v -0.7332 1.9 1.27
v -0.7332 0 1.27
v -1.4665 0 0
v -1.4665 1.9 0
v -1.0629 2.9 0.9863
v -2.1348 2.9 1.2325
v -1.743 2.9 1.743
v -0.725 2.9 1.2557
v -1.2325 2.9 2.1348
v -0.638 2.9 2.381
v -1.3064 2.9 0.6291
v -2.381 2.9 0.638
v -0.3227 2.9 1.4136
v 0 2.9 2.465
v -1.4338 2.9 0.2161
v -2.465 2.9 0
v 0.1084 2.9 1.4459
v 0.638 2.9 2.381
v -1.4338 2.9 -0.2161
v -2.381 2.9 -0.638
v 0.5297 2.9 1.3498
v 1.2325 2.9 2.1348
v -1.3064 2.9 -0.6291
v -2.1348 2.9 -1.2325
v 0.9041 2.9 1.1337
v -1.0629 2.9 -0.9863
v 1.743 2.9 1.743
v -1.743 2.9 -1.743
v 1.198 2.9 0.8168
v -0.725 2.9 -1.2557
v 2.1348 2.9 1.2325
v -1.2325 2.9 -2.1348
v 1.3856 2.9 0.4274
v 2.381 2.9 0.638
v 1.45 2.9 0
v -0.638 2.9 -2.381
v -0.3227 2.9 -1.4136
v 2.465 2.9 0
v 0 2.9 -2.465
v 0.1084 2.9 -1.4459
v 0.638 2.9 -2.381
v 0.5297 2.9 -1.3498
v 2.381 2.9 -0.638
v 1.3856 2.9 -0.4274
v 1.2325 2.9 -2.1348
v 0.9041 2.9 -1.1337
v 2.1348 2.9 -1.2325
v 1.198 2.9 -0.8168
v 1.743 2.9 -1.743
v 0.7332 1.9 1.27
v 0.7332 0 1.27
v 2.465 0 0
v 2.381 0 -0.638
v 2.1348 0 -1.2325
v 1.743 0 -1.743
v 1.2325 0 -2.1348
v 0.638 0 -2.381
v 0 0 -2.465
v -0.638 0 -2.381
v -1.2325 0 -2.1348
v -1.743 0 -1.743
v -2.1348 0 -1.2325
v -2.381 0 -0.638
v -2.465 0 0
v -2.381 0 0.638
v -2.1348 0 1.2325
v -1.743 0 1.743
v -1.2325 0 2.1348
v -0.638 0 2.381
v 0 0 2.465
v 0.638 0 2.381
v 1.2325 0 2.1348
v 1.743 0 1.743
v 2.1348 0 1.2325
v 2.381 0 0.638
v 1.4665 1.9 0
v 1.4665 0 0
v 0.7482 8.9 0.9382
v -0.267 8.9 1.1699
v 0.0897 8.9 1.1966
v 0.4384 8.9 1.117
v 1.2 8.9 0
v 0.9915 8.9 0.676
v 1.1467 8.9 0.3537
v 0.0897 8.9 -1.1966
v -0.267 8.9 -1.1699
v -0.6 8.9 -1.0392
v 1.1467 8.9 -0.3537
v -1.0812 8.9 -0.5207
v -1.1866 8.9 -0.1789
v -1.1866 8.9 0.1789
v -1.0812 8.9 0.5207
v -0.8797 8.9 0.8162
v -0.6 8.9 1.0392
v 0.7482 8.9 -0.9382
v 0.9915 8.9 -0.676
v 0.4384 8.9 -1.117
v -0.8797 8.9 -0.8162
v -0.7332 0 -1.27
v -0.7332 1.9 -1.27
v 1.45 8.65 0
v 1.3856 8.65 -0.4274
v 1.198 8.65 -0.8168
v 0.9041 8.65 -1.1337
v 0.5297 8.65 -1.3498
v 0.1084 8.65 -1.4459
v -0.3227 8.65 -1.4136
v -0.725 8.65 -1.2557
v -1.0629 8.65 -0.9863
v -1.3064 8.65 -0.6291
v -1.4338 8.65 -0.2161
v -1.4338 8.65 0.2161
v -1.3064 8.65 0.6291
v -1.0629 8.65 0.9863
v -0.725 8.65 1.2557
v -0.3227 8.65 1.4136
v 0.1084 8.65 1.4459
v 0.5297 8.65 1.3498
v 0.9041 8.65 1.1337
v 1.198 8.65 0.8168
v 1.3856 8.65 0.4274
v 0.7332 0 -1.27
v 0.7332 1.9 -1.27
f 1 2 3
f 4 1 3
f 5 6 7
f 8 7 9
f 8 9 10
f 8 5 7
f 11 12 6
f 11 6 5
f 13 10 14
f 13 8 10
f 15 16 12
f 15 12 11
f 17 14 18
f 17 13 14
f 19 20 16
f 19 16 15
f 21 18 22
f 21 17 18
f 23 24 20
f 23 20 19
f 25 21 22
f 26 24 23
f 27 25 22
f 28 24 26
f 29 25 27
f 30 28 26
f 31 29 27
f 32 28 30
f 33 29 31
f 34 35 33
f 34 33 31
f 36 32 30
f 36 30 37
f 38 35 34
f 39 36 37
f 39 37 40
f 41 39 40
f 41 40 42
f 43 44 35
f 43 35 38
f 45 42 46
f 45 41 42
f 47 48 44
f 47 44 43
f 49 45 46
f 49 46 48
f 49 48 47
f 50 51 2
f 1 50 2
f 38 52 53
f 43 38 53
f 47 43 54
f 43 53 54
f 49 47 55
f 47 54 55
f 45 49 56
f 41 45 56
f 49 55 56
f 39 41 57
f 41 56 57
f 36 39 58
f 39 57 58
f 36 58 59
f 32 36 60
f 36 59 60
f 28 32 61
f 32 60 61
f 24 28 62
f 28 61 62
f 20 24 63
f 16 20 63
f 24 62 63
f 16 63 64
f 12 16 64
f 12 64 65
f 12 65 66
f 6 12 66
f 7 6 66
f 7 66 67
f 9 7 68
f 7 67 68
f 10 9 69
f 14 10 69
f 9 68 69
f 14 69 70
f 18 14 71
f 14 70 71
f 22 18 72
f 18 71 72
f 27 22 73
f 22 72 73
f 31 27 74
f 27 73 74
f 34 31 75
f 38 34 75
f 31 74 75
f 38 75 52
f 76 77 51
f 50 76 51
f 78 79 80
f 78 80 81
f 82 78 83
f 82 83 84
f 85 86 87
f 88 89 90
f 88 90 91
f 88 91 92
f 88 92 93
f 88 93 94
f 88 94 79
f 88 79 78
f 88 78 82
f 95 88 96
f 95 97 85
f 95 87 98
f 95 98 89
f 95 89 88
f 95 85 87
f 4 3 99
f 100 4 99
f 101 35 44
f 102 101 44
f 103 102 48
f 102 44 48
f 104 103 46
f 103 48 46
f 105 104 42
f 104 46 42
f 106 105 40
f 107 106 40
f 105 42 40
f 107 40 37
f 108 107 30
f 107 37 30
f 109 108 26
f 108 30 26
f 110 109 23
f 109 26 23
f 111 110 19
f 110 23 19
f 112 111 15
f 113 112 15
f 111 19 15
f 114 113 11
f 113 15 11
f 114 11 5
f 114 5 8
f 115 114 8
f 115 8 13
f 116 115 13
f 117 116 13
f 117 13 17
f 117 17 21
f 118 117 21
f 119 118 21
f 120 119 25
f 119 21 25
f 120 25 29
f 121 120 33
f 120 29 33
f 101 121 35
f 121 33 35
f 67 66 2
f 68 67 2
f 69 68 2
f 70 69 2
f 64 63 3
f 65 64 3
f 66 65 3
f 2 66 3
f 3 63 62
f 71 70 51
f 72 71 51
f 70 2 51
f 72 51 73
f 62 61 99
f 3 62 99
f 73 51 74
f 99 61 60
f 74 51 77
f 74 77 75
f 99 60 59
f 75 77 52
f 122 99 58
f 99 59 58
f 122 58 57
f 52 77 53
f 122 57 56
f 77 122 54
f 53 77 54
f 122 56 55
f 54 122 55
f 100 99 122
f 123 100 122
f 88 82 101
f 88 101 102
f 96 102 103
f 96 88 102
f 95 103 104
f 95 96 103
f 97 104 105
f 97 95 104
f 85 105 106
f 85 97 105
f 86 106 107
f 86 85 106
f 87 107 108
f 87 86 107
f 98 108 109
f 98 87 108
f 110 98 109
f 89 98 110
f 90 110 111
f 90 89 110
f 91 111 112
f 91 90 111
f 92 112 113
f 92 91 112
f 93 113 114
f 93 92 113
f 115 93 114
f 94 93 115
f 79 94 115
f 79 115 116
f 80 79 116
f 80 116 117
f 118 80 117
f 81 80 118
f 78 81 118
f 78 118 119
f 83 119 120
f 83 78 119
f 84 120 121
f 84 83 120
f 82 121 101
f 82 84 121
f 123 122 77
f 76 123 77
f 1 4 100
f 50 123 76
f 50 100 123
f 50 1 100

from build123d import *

# Parameters (mm, degrees)
SKETCH1_R           = 2.465
BOSS_EXTRUDE1_DEPTH = 2.9
SKETCH2_R           = 1.45
BOSS_EXTRUDE2_DEPTH = 6
CUT_EXTRUDE1_DEPTH  = 1.9
CHAMFER1_SIZE       = 0.25


with BuildPart() as part:
    # Sketch1 → Boss-Extrude1 (new body)
    with BuildSketch(Plane(origin=(0, 0, 0), x_dir=(1, 0, 0), z_dir=(0, 1, 0))):
        Circle(SKETCH1_R)
    extrude(amount=BOSS_EXTRUDE1_DEPTH)

    # Sketch2 → Boss-Extrude2 (add)
    with BuildSketch(Plane(origin=(0, 2.9, 0), x_dir=(1, 0, 0), z_dir=(0, 1, 0))):
        Circle(SKETCH2_R)
    extrude(amount=BOSS_EXTRUDE2_DEPTH)

    # Sketch3 → Cut-Extrude1 (cut)
    with BuildSketch(Plane.XZ):
        Polygon((0.733234842, -1.27), (1.466469684, 0), (0.733234842, 1.27), (-0.733234842, 1.27), (-1.466469684, 0), (-0.733234842, -1.27), align=None)
    extrude(amount=-CUT_EXTRUDE1_DEPTH, mode=Mode.SUBTRACT)

    # Chamfer1
    chamfer1_edges = [part.edges().sort_by_distance(p)[0] for p in [
        (-1.45, 8.9, 0),
    ]]
    chamfer(chamfer1_edges, length=CHAMFER1_SIZE)


solid = part.part
